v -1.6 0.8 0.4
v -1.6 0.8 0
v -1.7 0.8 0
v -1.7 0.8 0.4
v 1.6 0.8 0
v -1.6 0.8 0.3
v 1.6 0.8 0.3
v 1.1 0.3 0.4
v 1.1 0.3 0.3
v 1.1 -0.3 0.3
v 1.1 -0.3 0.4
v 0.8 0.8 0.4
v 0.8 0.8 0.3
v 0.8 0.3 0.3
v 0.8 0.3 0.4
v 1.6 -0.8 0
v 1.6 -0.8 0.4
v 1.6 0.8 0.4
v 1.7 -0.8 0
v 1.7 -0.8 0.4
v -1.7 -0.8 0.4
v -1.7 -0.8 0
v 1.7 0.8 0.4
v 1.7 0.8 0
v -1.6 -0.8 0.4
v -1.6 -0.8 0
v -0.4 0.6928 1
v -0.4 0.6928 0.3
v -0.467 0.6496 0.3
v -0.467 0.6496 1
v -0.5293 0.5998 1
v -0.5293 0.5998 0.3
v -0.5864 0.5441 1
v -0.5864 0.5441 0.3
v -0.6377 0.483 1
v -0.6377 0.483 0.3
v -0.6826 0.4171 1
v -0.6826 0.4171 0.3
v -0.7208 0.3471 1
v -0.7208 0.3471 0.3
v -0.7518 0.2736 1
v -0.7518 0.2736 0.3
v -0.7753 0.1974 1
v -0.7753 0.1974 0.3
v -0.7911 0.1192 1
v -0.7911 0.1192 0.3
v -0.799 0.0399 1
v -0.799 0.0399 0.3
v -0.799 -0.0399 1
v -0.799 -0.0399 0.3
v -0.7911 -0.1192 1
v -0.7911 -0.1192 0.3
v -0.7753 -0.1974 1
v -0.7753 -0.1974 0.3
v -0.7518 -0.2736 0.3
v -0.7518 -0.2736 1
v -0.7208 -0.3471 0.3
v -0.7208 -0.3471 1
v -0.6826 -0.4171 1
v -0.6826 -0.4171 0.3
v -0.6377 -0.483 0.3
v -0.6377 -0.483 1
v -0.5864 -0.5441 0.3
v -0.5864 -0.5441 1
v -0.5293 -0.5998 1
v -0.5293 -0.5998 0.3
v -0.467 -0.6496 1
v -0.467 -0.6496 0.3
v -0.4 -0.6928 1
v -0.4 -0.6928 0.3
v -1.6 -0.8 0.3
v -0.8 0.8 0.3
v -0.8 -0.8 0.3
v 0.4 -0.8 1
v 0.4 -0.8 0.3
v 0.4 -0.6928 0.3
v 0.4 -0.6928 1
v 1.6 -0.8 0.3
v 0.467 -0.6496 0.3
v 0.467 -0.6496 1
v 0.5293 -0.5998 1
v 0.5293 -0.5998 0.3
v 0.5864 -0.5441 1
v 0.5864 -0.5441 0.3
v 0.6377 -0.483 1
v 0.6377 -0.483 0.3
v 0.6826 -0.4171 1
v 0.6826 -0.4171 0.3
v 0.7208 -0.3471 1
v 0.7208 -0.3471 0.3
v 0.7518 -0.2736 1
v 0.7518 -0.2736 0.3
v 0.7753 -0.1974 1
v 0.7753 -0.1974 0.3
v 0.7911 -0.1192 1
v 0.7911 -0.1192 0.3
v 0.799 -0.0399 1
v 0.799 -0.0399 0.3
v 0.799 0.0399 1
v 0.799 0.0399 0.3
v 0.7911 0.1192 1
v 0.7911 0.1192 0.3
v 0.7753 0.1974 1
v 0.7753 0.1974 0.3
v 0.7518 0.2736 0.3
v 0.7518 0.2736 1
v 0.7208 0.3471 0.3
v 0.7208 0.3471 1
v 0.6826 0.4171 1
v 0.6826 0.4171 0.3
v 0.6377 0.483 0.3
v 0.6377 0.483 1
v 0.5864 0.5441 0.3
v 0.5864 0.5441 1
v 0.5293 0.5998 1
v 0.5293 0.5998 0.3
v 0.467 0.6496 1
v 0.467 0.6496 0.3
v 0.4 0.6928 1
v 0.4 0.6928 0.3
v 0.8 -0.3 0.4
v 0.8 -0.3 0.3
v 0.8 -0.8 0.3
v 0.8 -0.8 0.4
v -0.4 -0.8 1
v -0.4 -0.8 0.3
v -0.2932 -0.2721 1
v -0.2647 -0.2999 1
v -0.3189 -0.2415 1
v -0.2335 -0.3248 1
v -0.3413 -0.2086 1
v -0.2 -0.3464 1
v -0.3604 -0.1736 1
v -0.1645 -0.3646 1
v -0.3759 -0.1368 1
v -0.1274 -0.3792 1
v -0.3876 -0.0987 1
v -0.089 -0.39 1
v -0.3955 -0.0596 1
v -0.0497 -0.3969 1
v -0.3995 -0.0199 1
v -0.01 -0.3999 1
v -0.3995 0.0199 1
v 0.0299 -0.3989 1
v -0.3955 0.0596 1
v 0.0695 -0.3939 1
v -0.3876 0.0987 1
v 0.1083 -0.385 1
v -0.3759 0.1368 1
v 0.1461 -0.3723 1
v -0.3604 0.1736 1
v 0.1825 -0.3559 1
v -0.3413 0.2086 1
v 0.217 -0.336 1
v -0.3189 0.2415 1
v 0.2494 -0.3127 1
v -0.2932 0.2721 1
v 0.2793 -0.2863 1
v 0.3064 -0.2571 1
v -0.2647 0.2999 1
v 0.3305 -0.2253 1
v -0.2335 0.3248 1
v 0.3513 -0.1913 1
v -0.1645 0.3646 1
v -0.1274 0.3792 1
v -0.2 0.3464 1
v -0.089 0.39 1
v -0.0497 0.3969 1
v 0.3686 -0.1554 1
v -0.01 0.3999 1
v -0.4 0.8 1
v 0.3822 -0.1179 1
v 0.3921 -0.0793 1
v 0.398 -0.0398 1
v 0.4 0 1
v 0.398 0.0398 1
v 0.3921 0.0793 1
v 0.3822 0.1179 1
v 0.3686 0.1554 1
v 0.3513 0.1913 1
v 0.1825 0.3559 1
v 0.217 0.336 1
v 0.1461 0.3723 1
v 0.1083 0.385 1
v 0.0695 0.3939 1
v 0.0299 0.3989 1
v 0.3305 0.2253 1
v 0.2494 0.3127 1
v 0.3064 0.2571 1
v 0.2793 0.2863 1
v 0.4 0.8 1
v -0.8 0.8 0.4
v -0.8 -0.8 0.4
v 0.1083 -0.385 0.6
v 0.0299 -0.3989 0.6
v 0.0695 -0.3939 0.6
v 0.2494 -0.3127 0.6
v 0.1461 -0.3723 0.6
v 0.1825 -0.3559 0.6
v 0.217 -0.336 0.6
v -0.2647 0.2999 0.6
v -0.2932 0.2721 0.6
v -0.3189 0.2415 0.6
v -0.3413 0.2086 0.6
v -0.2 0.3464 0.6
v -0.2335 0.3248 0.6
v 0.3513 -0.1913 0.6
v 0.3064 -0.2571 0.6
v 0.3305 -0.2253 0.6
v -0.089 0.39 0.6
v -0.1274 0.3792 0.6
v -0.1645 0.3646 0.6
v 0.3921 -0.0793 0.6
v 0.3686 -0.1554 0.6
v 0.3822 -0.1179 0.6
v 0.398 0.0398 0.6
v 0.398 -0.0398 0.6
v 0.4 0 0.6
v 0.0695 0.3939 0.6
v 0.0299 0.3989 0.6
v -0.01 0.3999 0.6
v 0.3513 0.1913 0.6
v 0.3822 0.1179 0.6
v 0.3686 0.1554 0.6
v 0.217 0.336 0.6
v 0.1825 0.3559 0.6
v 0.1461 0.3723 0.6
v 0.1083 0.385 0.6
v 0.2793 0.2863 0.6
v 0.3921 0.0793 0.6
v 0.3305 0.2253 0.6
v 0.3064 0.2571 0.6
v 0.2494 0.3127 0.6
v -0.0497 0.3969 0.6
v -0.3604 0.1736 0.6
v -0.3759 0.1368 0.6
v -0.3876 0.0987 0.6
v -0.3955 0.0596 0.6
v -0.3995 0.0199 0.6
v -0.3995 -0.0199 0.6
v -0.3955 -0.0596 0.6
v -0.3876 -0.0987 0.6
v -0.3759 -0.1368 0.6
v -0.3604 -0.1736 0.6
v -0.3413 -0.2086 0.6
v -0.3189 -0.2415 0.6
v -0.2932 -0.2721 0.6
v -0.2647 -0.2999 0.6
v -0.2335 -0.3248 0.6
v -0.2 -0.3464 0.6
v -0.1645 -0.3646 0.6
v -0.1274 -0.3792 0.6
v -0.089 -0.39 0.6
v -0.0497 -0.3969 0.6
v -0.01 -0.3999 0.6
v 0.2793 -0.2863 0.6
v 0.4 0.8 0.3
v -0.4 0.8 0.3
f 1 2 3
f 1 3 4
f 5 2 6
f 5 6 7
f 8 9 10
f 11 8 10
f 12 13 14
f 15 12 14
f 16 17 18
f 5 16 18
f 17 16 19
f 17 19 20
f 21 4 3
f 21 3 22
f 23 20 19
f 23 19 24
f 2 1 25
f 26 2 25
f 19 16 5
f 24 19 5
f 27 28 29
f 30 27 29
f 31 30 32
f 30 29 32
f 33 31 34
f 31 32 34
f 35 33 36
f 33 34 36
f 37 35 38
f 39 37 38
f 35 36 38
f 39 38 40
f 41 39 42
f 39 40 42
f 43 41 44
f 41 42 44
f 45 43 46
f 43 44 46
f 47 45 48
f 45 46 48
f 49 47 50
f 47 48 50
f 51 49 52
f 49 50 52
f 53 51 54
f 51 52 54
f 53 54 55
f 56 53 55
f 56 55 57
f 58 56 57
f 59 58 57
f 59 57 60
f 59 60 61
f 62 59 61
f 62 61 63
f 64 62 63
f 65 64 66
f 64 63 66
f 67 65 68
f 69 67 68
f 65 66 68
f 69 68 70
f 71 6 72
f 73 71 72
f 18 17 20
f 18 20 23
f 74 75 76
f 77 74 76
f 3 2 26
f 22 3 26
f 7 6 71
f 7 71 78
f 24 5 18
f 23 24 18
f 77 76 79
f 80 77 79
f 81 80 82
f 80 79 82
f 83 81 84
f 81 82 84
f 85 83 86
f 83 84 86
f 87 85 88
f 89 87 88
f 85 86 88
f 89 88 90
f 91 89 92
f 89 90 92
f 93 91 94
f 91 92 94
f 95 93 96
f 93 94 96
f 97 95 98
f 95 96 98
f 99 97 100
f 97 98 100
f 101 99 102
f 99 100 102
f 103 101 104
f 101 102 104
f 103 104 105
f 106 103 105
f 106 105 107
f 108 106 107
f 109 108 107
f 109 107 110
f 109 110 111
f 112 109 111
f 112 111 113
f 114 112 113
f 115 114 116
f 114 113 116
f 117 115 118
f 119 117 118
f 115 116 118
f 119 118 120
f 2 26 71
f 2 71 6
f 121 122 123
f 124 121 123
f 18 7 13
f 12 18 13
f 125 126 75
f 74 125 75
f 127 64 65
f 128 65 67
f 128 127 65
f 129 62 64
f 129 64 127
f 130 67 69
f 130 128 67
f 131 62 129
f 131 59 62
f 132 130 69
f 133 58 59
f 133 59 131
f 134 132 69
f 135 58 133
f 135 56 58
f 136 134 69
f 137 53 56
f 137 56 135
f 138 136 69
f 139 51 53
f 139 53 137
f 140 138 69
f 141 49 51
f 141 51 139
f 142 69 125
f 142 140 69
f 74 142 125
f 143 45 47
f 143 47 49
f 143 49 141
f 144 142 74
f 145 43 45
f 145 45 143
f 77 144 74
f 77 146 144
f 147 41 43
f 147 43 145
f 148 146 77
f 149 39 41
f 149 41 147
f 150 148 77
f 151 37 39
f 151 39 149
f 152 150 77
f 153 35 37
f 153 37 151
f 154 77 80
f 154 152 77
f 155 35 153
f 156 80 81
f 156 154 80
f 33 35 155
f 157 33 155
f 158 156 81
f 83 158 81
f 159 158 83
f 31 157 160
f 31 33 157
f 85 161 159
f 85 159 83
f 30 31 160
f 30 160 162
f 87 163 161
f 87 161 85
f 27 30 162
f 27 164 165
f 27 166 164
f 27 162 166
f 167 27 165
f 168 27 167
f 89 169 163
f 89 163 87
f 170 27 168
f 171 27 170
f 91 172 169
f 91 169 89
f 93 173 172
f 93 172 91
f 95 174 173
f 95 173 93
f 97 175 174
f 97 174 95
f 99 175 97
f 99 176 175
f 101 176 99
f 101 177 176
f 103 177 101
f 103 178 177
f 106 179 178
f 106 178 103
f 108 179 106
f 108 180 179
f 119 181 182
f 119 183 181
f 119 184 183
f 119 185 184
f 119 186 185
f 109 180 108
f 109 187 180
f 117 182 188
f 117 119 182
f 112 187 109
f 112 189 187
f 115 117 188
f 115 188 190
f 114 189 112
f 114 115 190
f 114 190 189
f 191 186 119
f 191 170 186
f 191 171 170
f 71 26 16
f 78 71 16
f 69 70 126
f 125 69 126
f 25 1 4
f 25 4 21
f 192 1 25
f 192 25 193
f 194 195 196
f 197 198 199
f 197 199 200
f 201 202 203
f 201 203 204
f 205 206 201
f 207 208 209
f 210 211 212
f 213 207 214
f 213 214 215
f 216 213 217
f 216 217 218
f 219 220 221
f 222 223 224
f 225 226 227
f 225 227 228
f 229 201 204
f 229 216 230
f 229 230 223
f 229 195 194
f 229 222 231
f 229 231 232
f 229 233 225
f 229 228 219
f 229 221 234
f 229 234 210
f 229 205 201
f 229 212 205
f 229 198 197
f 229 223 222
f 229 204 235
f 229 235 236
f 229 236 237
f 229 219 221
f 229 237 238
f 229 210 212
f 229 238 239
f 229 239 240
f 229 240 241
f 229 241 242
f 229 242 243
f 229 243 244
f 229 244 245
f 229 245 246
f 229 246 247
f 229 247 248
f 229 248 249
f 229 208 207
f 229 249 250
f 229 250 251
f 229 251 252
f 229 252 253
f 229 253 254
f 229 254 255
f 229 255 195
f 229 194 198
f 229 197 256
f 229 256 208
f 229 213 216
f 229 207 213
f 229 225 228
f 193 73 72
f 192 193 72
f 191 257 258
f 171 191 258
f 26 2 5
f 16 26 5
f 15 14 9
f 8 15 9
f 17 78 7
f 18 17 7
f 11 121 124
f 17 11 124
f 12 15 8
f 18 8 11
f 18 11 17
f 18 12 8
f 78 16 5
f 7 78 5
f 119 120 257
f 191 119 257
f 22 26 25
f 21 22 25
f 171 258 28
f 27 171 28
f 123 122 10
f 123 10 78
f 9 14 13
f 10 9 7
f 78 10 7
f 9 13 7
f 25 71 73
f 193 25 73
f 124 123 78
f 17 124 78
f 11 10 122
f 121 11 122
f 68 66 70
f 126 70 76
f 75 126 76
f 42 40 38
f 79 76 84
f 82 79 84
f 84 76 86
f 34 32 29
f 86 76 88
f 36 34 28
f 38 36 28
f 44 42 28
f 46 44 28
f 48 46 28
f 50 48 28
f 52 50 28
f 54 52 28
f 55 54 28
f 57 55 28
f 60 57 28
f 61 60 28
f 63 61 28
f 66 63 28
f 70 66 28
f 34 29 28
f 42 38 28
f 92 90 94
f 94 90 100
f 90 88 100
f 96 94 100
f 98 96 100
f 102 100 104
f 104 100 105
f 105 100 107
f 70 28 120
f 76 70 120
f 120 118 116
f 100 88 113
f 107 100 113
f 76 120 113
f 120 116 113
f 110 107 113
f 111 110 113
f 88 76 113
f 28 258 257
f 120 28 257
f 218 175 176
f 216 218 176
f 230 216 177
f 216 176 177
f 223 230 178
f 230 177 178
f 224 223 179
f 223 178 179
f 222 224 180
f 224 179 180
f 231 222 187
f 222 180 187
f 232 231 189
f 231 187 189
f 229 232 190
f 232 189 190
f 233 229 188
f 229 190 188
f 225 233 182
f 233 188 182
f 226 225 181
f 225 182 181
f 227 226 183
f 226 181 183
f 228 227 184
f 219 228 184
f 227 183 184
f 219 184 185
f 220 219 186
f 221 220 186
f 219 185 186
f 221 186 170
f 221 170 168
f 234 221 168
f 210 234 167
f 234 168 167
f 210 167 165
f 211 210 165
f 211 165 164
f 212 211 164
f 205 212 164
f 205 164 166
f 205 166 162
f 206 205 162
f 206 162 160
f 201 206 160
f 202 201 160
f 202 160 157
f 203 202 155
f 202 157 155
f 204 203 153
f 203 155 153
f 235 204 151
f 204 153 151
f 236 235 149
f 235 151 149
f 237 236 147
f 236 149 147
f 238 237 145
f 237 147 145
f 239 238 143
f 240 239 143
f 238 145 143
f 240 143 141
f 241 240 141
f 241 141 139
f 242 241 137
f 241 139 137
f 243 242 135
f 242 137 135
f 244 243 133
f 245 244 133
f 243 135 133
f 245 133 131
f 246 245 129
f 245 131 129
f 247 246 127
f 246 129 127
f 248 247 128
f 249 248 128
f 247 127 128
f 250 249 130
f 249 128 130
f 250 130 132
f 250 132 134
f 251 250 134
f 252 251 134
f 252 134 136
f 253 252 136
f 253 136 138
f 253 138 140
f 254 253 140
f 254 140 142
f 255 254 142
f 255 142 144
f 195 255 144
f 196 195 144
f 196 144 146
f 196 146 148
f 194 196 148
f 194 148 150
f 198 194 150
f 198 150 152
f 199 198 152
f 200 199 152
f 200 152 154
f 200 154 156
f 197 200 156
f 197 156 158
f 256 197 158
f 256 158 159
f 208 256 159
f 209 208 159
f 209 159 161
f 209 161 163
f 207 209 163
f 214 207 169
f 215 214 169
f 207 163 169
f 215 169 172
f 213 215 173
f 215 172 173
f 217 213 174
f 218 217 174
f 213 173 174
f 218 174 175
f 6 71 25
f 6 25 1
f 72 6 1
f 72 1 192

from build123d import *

# Parameters (mm, degrees)
F0_W      = 3.2
F0_H      = 1.6
F1_DEPTH  = 0.3
F2_W      = 0.8
F2_H      = 1.6
F3_DEPTH  = 0.1
F4_W      = 1.6
F4_H      = 0.4
F5_DEPTH  = 0.1
F6_W      = 1.6
F6_H      = 0.4
F7_DEPTH  = 0.1
F9_DEPTH  = 0.7
F10_R     = 0.4
F11_DEPTH = 0.4


with BuildPart() as f1:
    # F0 (on Top) → F1 (new body)
    with BuildSketch(Plane.XY):
        Rectangle(F0_W, F0_H)
    extrude(amount=F1_DEPTH)


with BuildPart() as f3:
    # F2 (on face) → F3 (new body)
    with BuildSketch(Plane.XY.offset(0.3)):
        with Locations((-1.2, 0)):
            Rectangle(F2_W, F2_H)
        Polygon((0.8, -0.3), (0.8, -0.8), (1.6, -0.8), (1.6, 0.8), (0.8, 0.8), (0.8, 0.3), (1.1, 0.3), (1.1, -0.3), align=None)
    extrude(amount=F3_DEPTH)


with BuildPart() as f5:
    # F4 (on face) → F5 (new body)
    with BuildSketch(Plane(origin=(-1.6, 0, 0), x_dir=(0, -1, 0), z_dir=(-1, 0, 0))):
        with Locations((0, 0.2)):
            Rectangle(F4_W, F4_H)
    extrude(amount=F5_DEPTH)


with BuildPart() as f7:
    # F6 (on face) → F7 (new body)
    with BuildSketch(Plane.YZ.offset(1.6)):
        with Locations((0, 0.2)):
            Rectangle(F6_W, F6_H)
    extrude(amount=F7_DEPTH)


with BuildPart() as f9:
    # F8 (on face) → F9 (new body)
    with BuildSketch(Plane.XY.offset(0.3)):
        with BuildLine():
            Line((-0.4, 0.8), (-0.4, 0.69282))
            ThreePointArc((-0.4, 0.69282), (-0.8, 0), (-0.4, -0.69282))
            Line((-0.4, -0.69282), (-0.4, -0.8))
            Line((-0.4, -0.8), (0.4, -0.8))
            Line((0.4, -0.8), (0.4, -0.69282))
            ThreePointArc((0.4, -0.69282), (0.8, 0), (0.4, 0.69282))
            Line((0.4, 0.69282), (0.4, 0.8))
            Line((0.4, 0.8), (-0.4, 0.8))
        make_face()
    extrude(amount=F9_DEPTH)

    # F10 (on face) → F11 (cut)
    with BuildSketch(Plane.XY.offset(1)):
        Circle(F10_R)
    extrude(amount=-F11_DEPTH, mode=Mode.SUBTRACT)


solid = Compound([f1.part, f3.part, f5.part, f7.part, f9.part])
